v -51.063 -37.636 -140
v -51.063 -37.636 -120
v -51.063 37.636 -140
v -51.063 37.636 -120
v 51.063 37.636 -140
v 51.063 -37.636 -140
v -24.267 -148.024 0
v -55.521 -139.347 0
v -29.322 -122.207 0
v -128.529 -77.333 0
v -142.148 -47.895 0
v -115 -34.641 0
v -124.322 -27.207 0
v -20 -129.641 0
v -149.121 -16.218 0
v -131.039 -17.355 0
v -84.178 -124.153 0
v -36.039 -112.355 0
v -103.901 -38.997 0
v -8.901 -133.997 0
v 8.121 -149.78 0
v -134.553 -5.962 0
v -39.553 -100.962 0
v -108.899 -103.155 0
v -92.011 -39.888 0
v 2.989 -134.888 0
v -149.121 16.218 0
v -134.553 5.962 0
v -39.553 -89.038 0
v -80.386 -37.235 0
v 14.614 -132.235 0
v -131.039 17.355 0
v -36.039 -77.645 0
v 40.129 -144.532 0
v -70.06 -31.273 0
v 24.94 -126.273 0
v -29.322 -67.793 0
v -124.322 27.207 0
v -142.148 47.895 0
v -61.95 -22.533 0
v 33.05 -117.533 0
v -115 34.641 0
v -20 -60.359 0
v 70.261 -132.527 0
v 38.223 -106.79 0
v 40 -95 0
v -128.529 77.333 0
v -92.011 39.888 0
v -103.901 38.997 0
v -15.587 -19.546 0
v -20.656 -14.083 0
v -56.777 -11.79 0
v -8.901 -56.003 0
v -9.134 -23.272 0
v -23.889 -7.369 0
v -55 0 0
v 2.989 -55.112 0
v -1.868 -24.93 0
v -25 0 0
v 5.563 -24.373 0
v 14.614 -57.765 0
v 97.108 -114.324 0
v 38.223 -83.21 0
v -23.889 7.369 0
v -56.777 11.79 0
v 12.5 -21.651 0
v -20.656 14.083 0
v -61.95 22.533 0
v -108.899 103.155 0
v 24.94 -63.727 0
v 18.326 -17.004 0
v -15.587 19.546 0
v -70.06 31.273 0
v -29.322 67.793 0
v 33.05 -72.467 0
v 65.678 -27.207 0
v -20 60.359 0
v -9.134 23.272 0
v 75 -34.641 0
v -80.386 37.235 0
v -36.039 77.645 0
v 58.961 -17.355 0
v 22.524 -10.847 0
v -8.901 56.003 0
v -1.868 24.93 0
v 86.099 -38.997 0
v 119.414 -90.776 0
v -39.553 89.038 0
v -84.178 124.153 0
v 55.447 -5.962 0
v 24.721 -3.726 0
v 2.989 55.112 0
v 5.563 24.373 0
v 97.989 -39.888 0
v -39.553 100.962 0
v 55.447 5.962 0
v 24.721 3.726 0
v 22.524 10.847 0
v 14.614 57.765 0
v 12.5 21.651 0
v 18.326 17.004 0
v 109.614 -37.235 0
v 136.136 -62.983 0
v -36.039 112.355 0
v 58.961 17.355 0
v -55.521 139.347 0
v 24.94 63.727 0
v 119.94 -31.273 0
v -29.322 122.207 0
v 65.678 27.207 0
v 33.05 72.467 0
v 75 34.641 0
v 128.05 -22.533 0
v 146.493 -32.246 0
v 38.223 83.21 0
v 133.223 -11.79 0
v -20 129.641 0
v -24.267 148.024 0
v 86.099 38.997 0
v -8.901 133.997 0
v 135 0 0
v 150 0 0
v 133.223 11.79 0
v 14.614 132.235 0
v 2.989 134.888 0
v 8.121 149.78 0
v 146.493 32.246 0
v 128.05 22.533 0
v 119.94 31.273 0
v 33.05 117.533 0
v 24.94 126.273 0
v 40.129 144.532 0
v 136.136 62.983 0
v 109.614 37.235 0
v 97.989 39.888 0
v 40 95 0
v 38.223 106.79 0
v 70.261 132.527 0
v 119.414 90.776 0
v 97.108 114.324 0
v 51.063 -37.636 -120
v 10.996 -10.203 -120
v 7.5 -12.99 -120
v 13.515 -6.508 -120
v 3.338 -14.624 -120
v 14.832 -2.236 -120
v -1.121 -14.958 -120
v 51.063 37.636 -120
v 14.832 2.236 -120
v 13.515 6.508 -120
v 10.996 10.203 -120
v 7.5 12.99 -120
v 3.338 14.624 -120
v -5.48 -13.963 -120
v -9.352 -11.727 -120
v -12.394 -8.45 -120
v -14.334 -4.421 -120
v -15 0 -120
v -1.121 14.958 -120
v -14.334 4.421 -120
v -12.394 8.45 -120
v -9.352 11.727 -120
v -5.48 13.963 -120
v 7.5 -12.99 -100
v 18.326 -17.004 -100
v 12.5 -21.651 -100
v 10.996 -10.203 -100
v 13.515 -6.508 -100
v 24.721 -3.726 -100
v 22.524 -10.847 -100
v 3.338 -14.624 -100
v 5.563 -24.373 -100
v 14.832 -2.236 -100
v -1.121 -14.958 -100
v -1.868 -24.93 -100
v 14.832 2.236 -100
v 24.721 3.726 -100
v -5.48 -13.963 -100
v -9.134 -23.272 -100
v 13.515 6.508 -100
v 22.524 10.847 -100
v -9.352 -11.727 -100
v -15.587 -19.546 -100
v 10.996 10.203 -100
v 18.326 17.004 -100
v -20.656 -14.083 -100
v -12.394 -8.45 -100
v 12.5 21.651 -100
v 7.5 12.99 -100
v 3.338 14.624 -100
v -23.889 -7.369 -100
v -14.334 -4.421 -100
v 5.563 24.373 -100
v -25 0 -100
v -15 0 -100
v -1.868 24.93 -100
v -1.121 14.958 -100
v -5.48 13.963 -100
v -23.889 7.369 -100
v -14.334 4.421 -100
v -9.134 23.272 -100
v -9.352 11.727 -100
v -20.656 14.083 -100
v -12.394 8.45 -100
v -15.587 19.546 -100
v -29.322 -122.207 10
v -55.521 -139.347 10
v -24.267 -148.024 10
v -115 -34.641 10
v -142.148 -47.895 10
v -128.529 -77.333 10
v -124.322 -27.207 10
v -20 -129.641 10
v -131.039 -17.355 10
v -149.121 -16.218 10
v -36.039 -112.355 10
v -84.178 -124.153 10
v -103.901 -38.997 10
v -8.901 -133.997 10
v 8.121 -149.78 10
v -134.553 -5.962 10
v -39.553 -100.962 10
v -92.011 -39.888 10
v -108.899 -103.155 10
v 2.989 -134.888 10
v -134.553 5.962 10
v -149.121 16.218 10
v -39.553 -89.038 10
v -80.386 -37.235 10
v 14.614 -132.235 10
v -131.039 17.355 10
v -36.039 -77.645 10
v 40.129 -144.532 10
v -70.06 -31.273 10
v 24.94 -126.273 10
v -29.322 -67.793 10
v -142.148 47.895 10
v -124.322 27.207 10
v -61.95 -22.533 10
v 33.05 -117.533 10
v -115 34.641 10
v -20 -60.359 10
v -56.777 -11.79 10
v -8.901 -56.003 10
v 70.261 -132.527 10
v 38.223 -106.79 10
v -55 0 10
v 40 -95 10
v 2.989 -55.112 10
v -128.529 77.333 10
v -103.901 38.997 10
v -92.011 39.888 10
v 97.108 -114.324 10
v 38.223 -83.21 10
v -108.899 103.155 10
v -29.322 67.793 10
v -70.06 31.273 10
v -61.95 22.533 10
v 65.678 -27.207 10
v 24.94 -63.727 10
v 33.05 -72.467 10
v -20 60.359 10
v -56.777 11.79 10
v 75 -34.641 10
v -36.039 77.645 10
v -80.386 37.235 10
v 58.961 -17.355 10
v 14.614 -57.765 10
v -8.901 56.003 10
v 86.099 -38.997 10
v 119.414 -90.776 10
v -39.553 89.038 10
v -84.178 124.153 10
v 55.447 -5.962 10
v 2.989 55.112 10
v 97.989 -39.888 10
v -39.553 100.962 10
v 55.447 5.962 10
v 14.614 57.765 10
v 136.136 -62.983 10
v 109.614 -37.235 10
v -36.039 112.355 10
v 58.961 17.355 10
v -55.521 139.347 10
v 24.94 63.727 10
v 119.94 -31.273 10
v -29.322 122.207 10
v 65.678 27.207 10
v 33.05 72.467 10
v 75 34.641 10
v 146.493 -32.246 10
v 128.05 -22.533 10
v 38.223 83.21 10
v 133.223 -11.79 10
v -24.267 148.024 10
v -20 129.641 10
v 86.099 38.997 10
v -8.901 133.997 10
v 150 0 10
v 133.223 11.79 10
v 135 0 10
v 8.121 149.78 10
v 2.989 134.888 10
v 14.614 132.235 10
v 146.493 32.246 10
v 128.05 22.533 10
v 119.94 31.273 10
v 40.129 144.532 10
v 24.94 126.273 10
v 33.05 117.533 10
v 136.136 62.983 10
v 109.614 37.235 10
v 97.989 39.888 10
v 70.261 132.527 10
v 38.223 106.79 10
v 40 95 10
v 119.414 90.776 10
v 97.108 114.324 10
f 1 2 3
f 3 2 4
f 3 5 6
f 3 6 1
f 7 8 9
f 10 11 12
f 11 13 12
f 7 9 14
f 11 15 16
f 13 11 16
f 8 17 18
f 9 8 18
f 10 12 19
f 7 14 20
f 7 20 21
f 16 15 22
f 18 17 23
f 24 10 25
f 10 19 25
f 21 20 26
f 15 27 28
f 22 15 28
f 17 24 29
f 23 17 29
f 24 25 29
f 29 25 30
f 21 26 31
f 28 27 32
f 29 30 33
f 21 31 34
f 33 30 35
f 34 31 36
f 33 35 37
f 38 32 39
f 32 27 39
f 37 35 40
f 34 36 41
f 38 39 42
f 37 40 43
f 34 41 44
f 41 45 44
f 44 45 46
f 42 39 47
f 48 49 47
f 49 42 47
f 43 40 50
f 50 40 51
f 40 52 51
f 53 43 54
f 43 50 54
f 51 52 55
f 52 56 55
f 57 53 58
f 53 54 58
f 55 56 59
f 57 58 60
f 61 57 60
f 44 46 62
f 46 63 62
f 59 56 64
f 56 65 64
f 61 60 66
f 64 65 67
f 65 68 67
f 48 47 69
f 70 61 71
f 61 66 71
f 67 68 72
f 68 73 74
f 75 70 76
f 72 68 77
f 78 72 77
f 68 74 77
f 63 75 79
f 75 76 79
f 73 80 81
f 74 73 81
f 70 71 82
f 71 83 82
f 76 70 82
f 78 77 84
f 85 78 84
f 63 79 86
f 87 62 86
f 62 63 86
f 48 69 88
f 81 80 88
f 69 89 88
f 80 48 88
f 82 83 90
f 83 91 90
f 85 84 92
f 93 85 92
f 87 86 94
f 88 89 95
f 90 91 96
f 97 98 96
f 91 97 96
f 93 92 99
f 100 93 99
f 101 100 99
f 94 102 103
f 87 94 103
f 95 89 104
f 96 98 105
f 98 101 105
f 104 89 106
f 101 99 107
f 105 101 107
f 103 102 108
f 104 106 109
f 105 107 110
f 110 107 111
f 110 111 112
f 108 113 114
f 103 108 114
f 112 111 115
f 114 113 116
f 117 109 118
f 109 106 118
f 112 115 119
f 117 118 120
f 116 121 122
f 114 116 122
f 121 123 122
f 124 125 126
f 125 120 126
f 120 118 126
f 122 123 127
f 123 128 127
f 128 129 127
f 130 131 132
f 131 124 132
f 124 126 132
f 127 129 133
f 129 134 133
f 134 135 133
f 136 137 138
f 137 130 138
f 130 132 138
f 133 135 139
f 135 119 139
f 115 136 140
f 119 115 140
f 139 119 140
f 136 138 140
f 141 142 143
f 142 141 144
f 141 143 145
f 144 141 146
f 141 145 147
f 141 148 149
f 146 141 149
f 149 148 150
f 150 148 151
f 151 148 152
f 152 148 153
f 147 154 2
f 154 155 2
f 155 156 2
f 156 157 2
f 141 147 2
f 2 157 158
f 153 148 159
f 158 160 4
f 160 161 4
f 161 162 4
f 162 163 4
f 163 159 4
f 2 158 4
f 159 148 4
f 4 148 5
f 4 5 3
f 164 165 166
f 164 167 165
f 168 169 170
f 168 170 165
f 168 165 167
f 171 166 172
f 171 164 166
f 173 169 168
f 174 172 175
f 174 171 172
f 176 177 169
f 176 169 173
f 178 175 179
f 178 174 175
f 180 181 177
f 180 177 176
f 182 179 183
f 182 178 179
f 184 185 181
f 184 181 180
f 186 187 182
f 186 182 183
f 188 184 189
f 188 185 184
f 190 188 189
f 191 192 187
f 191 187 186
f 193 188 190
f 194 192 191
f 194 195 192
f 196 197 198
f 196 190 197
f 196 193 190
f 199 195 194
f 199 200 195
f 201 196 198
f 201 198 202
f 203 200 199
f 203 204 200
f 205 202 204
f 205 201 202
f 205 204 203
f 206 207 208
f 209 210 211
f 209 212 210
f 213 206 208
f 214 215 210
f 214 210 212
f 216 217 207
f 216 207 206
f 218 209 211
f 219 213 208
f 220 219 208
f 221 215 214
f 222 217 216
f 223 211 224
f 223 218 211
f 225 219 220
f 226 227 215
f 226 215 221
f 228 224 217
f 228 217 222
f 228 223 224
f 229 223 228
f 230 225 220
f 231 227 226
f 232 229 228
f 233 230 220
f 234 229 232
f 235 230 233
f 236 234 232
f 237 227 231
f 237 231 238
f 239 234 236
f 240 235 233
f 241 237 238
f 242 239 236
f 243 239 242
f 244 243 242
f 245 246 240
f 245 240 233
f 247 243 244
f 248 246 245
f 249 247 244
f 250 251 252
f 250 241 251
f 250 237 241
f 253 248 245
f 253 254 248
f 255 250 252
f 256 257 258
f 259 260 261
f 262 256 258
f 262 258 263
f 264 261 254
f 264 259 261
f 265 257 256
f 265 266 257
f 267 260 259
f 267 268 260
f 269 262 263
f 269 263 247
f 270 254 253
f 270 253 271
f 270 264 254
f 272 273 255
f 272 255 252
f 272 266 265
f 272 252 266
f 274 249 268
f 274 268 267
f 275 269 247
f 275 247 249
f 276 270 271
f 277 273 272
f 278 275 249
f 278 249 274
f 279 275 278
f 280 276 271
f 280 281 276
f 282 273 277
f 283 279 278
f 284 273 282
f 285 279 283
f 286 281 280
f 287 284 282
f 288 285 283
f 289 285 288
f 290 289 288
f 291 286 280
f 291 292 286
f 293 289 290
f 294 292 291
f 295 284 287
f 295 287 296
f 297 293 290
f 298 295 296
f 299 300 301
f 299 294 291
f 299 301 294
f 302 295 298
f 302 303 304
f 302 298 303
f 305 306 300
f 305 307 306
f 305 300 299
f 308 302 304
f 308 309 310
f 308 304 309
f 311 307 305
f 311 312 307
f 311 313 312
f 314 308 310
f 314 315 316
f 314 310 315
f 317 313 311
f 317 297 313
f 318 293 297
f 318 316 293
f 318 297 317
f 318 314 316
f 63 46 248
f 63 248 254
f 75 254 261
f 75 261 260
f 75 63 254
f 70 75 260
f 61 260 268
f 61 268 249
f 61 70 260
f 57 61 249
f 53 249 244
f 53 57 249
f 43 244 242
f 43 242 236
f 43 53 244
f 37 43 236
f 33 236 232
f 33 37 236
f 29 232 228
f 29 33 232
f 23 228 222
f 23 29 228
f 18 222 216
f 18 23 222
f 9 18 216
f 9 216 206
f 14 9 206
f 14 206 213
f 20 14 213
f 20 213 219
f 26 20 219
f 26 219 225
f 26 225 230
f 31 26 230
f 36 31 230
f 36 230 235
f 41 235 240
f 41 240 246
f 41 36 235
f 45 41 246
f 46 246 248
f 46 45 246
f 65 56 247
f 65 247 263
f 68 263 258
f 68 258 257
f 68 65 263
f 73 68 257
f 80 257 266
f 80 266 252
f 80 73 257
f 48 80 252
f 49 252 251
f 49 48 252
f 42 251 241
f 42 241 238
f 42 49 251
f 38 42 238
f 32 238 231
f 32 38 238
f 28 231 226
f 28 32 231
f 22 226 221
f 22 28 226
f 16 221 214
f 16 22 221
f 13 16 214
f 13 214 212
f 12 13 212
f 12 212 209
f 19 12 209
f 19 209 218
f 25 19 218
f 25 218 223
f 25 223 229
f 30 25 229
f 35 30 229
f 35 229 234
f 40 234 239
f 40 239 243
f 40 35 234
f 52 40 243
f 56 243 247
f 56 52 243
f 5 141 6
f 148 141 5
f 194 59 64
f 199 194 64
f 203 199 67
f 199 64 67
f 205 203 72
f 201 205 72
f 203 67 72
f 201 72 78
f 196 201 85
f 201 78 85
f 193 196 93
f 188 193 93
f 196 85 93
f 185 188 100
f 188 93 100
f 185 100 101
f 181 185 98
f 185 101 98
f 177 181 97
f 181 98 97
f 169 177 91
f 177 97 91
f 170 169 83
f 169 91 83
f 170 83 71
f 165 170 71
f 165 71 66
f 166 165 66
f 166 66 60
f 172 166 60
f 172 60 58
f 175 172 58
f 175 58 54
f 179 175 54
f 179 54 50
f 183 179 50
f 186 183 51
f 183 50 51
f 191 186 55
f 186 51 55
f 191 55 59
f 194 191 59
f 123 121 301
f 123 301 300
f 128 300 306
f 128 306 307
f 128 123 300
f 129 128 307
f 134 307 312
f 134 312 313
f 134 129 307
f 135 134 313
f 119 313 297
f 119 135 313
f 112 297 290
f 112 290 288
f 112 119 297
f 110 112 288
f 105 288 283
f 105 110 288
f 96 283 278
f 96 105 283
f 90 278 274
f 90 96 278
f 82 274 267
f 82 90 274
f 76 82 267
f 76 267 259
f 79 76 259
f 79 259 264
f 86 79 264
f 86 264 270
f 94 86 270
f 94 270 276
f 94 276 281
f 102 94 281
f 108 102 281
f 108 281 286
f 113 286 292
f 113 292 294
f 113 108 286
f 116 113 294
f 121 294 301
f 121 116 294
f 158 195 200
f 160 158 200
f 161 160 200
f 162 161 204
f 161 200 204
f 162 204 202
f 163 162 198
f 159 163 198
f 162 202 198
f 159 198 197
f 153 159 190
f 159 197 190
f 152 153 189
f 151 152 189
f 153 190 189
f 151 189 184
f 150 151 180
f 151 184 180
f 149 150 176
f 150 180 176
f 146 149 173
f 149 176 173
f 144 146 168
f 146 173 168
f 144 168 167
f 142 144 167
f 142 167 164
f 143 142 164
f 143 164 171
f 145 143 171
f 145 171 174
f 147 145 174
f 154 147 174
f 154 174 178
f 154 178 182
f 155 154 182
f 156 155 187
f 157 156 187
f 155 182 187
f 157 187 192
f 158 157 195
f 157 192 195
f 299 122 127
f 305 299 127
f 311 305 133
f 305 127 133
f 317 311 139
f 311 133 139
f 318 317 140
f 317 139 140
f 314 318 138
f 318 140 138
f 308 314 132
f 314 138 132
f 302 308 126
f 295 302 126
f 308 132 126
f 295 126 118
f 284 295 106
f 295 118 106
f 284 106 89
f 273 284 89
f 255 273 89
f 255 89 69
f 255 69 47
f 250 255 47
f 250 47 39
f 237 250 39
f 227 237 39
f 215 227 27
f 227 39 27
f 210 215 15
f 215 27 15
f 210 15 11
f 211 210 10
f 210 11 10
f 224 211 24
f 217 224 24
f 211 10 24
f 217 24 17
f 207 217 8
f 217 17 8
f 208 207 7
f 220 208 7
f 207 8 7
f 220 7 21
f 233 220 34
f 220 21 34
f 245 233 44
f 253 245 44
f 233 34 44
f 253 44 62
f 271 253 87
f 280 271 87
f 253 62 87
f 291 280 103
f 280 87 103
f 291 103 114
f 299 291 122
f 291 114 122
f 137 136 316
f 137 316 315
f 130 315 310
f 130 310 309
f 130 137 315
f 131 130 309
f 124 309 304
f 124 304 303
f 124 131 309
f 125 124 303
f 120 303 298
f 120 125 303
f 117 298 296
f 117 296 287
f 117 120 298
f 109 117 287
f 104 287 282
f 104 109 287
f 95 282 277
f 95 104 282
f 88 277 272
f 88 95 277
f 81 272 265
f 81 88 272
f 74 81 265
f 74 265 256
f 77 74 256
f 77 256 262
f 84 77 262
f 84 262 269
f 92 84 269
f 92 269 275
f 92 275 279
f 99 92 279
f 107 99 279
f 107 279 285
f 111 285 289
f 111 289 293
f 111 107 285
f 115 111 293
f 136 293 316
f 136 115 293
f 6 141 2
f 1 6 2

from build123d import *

# Parameters (mm, degrees)
SKETCH1_R           = 150
SKETCH1_R_2         = 40
BOSS_EXTRUDE1_DEPTH = 10
SKETCH2_R           = 25
BOSS_EXTRUDE2_DEPTH = 100
SKETCH3_R           = 15
BOSS_EXTRUDE3_DEPTH = 20
SKETCH4_W           = 102.125411964
SKETCH4_H           = 75.272699472
BOSS_EXTRUDE4_DEPTH = 20


with BuildPart() as part:
    # Sketch1 → Boss-Extrude1 (new body)
    with BuildSketch(Plane.XY):
        Circle(SKETCH1_R)
        with Locations((0, 95)):
            Circle(SKETCH1_R_2, mode=Mode.SUBTRACT)
        with Locations((95, 0)):
            Circle(SKETCH1_R_2, mode=Mode.SUBTRACT)
        with Locations((0, -95)):
            Circle(SKETCH1_R_2, mode=Mode.SUBTRACT)
        with Locations((-95, 0)):
            Circle(SKETCH1_R_2, mode=Mode.SUBTRACT)
    extrude(amount=BOSS_EXTRUDE1_DEPTH)

    # Sketch2 → Boss-Extrude2 (add)
    with BuildSketch(Plane(origin=(0, 0, 0), x_dir=(-1, 0, 0), z_dir=(0, 0, -1))):
        Circle(SKETCH2_R)
    extrude(amount=BOSS_EXTRUDE2_DEPTH)

    # Sketch3 → Boss-Extrude3 (add)
    with BuildSketch(Plane(origin=(0, 0, -100), x_dir=(-1, 0, 0), z_dir=(0, 0, -1))):
        Circle(SKETCH3_R)
    extrude(amount=BOSS_EXTRUDE3_DEPTH)

    # Sketch4 → Boss-Extrude4 (add)
    with BuildSketch(Plane(origin=(0, 0, -120), x_dir=(-1, 0, 0), z_dir=(0, 0, -1))):
        Rectangle(SKETCH4_W, SKETCH4_H)
    extrude(amount=BOSS_EXTRUDE4_DEPTH)


solid = part.part
